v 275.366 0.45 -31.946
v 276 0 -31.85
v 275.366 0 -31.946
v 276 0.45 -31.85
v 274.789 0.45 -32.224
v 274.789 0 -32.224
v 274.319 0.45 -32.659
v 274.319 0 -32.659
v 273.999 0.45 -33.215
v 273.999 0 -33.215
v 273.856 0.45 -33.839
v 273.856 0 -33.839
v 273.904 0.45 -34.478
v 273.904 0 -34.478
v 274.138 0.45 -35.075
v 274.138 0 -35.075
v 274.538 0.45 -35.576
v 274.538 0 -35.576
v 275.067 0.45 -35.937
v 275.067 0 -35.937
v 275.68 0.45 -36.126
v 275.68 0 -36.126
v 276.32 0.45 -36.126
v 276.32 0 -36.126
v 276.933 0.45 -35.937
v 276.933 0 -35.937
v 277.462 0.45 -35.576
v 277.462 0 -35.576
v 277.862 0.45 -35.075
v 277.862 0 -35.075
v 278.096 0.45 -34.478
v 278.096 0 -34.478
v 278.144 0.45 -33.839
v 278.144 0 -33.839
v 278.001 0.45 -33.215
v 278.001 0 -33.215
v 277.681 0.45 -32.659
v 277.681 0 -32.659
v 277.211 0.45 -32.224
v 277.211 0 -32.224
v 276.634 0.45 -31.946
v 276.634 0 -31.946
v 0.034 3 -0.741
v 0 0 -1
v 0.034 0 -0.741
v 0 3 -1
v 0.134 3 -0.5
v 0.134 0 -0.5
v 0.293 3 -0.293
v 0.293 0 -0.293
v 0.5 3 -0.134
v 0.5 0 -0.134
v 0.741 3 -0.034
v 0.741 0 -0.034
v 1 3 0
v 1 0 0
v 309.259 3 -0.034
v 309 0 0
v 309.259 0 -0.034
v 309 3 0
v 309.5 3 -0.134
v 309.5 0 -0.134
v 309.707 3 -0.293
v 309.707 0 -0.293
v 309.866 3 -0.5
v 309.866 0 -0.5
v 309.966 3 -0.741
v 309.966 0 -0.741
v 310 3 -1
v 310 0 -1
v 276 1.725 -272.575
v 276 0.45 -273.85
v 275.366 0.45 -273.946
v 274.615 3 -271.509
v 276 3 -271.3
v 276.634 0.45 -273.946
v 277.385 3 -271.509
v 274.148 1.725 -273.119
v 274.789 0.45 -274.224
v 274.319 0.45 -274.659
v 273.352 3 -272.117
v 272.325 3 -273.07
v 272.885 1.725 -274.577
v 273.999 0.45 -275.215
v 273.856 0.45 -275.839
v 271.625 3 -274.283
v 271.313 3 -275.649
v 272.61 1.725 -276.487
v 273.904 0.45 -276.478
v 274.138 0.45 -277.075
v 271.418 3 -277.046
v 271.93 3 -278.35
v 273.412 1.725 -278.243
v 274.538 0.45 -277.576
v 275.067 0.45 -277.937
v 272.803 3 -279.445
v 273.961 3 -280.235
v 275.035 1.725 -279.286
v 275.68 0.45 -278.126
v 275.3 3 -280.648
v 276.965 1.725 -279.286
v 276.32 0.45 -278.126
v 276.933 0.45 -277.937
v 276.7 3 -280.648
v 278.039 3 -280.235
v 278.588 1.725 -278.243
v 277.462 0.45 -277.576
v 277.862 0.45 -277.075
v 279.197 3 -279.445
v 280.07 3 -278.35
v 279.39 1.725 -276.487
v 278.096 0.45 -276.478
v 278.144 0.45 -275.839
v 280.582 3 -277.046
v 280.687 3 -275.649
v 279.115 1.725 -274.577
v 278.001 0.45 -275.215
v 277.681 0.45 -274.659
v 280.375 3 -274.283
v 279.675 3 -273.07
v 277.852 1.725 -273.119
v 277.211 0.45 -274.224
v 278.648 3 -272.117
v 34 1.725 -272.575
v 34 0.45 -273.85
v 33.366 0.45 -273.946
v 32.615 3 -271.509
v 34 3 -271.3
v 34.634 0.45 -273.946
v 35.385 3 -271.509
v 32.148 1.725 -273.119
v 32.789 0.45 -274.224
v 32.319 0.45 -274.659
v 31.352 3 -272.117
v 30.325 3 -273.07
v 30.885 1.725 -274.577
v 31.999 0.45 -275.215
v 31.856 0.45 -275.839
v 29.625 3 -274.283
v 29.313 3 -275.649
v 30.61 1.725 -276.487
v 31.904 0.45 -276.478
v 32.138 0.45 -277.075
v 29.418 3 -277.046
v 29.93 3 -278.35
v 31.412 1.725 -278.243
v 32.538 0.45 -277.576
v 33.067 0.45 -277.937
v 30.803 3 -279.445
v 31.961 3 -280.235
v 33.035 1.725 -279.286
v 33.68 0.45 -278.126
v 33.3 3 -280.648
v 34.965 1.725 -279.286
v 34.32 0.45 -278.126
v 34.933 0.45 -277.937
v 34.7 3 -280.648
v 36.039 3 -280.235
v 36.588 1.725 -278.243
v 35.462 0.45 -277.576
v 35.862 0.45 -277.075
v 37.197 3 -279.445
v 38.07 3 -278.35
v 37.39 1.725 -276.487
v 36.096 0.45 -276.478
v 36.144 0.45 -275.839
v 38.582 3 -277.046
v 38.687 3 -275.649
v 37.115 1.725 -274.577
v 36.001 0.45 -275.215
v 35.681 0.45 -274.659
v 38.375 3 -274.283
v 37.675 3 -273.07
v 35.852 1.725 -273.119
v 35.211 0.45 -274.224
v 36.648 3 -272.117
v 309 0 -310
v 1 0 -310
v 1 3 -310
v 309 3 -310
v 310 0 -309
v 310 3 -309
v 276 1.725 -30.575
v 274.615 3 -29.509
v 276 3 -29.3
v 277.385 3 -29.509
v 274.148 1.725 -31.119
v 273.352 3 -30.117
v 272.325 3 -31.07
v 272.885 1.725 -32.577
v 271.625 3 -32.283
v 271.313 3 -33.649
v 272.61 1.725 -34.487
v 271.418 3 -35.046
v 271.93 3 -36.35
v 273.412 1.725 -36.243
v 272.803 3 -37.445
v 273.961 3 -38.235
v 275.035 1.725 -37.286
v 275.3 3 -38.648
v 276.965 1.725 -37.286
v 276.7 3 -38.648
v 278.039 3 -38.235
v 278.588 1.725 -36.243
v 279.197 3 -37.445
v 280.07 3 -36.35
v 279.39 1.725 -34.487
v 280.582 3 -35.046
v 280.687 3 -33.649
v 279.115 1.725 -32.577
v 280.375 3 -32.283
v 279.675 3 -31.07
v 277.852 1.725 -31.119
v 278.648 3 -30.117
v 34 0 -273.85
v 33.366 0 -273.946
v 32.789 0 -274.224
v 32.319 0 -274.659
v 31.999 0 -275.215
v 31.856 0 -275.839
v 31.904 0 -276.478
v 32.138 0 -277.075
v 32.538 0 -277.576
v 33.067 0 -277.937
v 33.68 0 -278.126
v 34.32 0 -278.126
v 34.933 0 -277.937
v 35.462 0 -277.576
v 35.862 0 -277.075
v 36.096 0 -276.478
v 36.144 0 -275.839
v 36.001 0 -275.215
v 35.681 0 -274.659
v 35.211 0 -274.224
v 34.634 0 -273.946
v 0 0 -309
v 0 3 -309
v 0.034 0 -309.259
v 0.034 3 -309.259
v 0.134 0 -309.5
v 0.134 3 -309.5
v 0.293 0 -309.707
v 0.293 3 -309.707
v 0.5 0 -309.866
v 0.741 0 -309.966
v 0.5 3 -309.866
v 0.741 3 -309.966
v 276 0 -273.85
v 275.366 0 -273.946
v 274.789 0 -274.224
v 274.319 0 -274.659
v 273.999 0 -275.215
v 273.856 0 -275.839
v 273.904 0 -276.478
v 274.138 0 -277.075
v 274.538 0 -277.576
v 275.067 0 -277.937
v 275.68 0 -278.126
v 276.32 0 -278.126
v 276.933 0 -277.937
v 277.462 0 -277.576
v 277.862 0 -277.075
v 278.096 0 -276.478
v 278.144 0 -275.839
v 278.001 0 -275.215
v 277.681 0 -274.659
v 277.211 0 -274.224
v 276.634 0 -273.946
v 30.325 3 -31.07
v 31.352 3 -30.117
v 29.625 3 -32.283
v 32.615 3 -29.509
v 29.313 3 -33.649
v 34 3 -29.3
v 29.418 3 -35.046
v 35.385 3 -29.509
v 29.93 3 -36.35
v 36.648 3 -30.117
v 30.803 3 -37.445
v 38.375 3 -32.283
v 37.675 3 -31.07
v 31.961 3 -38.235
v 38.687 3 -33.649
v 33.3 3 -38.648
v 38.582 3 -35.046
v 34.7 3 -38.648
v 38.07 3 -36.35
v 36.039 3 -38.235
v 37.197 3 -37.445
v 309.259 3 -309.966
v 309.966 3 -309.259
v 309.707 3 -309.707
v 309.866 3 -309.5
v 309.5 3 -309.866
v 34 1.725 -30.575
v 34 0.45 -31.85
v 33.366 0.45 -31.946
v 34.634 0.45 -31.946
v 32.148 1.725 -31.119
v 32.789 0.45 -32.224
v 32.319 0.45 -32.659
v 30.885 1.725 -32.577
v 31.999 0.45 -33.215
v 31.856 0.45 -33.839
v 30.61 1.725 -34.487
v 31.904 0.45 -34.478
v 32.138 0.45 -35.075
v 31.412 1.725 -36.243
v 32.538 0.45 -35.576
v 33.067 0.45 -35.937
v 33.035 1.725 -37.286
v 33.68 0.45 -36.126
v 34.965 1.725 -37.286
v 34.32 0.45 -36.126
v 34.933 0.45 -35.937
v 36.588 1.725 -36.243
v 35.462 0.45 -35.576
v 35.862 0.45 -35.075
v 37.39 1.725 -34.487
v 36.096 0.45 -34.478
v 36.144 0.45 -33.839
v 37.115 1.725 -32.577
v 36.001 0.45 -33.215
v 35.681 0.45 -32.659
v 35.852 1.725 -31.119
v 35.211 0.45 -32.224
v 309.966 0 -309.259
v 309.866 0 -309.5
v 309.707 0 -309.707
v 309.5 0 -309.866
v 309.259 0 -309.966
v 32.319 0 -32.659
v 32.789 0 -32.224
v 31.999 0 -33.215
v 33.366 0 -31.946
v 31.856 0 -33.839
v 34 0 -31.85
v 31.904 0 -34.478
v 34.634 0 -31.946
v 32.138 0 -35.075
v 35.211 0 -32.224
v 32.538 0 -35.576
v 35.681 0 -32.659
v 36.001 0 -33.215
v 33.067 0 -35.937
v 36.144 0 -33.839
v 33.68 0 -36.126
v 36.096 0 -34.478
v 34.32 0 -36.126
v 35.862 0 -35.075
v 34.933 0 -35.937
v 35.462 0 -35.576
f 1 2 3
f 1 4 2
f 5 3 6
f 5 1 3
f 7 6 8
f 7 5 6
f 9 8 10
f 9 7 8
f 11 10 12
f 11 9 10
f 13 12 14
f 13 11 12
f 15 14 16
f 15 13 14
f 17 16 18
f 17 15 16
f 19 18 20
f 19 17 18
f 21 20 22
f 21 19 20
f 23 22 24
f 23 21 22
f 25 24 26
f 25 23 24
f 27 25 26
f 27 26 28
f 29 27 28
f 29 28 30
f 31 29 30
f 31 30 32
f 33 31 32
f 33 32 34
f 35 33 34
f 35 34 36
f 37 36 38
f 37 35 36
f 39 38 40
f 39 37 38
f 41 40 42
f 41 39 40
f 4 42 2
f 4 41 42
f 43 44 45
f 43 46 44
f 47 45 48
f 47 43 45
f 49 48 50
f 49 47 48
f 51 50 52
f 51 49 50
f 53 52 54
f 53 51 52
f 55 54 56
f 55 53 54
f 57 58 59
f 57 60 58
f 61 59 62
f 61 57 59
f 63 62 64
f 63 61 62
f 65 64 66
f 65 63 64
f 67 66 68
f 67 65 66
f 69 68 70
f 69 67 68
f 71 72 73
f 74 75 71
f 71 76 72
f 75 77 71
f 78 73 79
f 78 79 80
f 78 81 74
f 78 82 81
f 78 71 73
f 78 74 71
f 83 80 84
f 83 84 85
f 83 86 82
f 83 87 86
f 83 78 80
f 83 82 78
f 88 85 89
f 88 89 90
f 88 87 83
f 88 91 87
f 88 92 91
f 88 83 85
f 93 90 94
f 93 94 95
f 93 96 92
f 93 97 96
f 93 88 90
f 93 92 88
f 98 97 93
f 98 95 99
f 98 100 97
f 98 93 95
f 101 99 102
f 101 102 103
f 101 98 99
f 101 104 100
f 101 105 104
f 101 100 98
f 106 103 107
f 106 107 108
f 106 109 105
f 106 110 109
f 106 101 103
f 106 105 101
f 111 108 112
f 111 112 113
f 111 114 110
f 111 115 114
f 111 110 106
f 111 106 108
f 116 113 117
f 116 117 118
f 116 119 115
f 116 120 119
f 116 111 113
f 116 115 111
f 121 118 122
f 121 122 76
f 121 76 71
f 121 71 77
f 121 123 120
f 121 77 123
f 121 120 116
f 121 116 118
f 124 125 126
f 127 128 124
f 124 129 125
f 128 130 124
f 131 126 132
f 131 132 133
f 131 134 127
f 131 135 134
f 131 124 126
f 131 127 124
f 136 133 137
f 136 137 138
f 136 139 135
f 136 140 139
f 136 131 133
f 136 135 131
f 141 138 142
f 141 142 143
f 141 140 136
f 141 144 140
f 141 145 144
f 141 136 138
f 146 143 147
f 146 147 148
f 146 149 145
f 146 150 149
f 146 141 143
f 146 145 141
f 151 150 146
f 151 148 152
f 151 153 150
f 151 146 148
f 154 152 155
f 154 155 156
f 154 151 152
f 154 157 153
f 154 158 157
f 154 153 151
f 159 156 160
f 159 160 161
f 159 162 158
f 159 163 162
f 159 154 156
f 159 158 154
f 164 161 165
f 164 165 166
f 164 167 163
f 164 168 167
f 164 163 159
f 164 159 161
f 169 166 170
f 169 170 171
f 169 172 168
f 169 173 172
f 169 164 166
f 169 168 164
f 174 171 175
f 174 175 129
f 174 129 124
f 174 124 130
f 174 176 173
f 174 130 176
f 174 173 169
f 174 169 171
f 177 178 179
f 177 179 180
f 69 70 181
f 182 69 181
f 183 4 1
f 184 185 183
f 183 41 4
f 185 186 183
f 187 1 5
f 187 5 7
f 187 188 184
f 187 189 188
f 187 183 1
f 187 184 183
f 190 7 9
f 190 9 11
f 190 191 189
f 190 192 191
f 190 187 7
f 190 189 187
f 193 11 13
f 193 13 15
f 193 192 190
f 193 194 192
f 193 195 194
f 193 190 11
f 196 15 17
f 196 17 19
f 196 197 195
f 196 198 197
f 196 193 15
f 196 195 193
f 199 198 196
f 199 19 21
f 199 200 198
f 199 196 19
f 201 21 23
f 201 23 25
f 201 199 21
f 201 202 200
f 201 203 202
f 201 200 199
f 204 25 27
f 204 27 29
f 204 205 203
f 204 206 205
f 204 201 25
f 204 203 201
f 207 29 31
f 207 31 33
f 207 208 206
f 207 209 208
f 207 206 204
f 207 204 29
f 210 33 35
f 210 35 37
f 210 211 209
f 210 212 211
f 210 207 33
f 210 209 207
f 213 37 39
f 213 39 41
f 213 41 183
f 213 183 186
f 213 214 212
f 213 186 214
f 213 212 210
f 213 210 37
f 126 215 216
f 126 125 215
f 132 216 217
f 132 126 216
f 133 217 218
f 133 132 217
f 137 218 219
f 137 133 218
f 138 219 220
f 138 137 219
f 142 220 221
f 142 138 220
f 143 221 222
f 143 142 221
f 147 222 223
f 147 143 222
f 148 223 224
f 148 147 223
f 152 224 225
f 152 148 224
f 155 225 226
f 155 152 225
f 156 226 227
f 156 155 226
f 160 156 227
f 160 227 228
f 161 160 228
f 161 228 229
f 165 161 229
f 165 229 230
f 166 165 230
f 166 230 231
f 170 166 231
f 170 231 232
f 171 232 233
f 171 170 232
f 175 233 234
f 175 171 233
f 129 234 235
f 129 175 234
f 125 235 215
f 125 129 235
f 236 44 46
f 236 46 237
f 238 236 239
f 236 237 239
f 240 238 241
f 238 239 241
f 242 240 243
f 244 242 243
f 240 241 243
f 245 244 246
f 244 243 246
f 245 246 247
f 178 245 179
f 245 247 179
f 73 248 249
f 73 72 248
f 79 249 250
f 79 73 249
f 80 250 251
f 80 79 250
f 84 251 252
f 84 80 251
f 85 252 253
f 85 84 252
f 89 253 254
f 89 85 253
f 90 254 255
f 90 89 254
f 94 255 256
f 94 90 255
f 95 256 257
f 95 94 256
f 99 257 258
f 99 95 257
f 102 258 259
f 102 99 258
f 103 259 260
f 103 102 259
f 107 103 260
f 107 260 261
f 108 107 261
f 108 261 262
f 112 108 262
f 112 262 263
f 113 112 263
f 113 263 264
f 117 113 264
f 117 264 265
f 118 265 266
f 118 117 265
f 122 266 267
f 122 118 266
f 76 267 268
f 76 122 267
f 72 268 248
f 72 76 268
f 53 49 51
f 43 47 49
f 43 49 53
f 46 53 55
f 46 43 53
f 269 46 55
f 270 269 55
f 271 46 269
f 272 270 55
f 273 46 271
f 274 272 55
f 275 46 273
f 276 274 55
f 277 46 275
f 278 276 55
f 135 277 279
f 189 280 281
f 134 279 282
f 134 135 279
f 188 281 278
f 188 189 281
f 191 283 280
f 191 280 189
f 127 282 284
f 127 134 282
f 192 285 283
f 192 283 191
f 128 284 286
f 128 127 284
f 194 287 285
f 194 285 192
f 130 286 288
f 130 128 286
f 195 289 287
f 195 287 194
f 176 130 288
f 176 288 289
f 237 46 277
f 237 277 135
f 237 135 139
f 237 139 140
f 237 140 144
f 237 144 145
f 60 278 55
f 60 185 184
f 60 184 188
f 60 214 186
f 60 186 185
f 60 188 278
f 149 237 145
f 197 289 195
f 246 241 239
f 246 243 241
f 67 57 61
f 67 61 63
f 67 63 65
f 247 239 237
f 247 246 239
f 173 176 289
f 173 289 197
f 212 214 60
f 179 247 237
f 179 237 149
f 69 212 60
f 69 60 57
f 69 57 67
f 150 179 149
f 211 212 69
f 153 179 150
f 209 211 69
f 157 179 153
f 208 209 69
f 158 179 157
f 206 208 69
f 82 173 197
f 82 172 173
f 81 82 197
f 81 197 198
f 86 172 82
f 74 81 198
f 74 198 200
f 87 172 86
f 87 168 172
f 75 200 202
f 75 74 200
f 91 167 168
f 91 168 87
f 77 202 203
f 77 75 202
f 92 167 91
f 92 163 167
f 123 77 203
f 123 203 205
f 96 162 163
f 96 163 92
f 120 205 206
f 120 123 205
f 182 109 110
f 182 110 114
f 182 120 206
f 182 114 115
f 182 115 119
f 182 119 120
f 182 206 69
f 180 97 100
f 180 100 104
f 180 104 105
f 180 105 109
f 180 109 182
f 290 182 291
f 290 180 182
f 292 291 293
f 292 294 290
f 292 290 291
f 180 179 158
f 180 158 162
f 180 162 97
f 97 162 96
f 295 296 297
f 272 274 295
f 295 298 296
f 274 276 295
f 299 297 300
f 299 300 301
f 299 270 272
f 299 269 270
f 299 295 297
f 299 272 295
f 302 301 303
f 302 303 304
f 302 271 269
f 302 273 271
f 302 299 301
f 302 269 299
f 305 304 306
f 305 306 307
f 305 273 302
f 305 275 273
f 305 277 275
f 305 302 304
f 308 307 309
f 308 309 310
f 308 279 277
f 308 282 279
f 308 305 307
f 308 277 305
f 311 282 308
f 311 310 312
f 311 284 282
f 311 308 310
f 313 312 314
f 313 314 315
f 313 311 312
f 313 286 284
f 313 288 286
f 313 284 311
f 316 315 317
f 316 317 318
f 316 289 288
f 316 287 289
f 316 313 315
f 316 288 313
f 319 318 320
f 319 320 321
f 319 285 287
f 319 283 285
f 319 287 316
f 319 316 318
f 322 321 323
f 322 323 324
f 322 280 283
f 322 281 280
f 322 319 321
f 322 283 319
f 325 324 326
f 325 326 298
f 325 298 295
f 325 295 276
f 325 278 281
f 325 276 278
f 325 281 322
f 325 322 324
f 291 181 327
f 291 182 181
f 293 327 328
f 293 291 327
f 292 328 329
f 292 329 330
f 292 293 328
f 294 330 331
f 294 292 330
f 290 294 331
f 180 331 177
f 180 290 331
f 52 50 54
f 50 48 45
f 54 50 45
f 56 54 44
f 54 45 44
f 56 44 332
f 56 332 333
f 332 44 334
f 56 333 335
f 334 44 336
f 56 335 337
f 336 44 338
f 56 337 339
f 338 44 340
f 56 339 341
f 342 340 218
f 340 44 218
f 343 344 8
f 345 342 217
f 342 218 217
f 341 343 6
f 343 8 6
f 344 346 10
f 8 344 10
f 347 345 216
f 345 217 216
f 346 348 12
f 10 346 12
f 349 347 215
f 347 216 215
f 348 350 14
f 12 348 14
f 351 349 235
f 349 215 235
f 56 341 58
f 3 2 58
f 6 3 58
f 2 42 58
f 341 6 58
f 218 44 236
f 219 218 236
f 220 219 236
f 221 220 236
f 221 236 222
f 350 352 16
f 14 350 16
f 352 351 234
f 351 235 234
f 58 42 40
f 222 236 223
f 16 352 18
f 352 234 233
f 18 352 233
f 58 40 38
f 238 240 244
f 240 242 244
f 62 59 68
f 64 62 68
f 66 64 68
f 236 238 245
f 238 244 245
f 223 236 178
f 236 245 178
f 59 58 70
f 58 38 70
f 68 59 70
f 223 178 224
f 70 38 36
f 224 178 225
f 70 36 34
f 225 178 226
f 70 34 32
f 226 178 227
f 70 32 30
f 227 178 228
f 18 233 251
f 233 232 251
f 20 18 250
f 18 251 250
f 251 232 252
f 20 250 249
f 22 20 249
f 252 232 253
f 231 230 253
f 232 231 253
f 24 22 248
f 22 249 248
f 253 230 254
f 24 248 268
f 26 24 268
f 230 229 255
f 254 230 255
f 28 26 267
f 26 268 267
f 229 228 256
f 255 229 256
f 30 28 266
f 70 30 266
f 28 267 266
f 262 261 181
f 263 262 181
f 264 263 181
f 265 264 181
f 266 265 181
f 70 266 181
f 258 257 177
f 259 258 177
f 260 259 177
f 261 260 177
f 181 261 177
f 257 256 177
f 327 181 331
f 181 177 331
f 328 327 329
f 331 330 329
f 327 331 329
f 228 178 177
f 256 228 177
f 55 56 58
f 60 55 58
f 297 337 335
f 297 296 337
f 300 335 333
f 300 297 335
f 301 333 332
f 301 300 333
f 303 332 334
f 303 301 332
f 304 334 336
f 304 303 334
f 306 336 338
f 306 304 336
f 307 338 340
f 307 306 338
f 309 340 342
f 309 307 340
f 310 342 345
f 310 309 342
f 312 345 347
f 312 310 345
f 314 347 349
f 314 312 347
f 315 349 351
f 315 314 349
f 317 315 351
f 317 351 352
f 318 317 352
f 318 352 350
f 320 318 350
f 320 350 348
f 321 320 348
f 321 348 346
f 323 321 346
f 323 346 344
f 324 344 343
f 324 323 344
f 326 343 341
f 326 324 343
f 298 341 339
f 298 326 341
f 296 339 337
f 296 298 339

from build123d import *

# Parameters (mm, degrees)
SZKIC1_W                                    = 310
SZKIC1_H                                    = 310
DODANIE_WYCI_GNI_CIE1_DEPTH                 = 3
ZAOKR_GLENIE1_R                             = 1
POG_BIENIE_STO_KOWE_POD_M4_WKR_T_DO_2_COUNT = 2
POG_BIENIE_STO_KOWE_POD_M4_WKR_T_DO_2_PITCH = 242
POG_BIENIE_STO_KOWE_POD_M4_WKR_T_DO_3_COUNT = 2
POG_BIENIE_STO_KOWE_POD_M4_WKR_T_DO_3_PITCH = 342.239682094
POG_BIENIE_STO_KOWE_POD_M4_WKR_T_DO_4_COUNT = 2
POG_BIENIE_STO_KOWE_POD_M4_WKR_T_DO_4_PITCH = 242


with BuildPart() as part:
    # Szkic1 → Dodanie-wyciągnięcie1 (new body)
    with BuildSketch(Plane(origin=(0, 0, 0), x_dir=(1, 0, 0), z_dir=(0, 1, 0))):
        with Locations((155, 155)):
            Rectangle(SZKIC1_W, SZKIC1_H)
    extrude(amount=DODANIE_WYCI_GNI_CIE1_DEPTH)

    # Zaokrąglenie1
    zaokr_glenie1_edges = [part.edges().sort_by_distance(p)[0] for p in [
        (0, 1.5, -310),
        (310, 1.5, -310),
        (310, 1.5, 0),
        (0, 1.5, 0),
    ]]
    fillet(zaokr_glenie1_edges, radius=ZAOKR_GLENIE1_R)

    # Szkic3 → Pogłębienie stożkowe pod M4 wkręt do części metalowych z łbem soczewkowym1 (revolve, cut)
    with BuildSketch(Plane(origin=(34, 3, -276), x_dir=(0, 0, 1), z_dir=(1, 0, 0))):
        Polygon((0, 0), (0, 3), (2.15, 3), (2.15, 2.55), (4.7, 0), align=None)
    pog_bienie_sto_kowe_pod_m4_wkr_t_do_cz_c = revolve(axis=Axis((34, 9.35, -276), (0, -1, 0)), mode=Mode.SUBTRACT)

    # Pog_bienie sto_kowe pod M4 wkr_t do  2: Pogłębienie stożkowe pod M4 wkręt do części metalowych z łbem soczewkowym1 ×2
    with Locations(*[(0, 0, i * POG_BIENIE_STO_KOWE_POD_M4_WKR_T_DO_2_PITCH) for i in range(1, POG_BIENIE_STO_KOWE_POD_M4_WKR_T_DO_2_COUNT)]):
        add(pog_bienie_sto_kowe_pod_m4_wkr_t_do_cz_c, mode=Mode.SUBTRACT)

    # Pog_bienie sto_kowe pod M4 wkr_t do  3: Pogłębienie stożkowe pod M4 wkręt do części metalowych z łbem soczewkowym1 ×2
    with Locations(*[Vector(0.7071067811865476, 0, 0.7071067811865475) * (i * POG_BIENIE_STO_KOWE_POD_M4_WKR_T_DO_3_PITCH) for i in range(1, POG_BIENIE_STO_KOWE_POD_M4_WKR_T_DO_3_COUNT)]):
        add(pog_bienie_sto_kowe_pod_m4_wkr_t_do_cz_c, mode=Mode.SUBTRACT)

    # Pog_bienie sto_kowe pod M4 wkr_t do  4: Pogłębienie stożkowe pod M4 wkręt do części metalowych z łbem soczewkowym1 ×2
    with Locations(*[(i * POG_BIENIE_STO_KOWE_POD_M4_WKR_T_DO_4_PITCH, 0, 0) for i in range(1, POG_BIENIE_STO_KOWE_POD_M4_WKR_T_DO_4_COUNT)]):
        add(pog_bienie_sto_kowe_pod_m4_wkr_t_do_cz_c, mode=Mode.SUBTRACT)


solid = part.part
